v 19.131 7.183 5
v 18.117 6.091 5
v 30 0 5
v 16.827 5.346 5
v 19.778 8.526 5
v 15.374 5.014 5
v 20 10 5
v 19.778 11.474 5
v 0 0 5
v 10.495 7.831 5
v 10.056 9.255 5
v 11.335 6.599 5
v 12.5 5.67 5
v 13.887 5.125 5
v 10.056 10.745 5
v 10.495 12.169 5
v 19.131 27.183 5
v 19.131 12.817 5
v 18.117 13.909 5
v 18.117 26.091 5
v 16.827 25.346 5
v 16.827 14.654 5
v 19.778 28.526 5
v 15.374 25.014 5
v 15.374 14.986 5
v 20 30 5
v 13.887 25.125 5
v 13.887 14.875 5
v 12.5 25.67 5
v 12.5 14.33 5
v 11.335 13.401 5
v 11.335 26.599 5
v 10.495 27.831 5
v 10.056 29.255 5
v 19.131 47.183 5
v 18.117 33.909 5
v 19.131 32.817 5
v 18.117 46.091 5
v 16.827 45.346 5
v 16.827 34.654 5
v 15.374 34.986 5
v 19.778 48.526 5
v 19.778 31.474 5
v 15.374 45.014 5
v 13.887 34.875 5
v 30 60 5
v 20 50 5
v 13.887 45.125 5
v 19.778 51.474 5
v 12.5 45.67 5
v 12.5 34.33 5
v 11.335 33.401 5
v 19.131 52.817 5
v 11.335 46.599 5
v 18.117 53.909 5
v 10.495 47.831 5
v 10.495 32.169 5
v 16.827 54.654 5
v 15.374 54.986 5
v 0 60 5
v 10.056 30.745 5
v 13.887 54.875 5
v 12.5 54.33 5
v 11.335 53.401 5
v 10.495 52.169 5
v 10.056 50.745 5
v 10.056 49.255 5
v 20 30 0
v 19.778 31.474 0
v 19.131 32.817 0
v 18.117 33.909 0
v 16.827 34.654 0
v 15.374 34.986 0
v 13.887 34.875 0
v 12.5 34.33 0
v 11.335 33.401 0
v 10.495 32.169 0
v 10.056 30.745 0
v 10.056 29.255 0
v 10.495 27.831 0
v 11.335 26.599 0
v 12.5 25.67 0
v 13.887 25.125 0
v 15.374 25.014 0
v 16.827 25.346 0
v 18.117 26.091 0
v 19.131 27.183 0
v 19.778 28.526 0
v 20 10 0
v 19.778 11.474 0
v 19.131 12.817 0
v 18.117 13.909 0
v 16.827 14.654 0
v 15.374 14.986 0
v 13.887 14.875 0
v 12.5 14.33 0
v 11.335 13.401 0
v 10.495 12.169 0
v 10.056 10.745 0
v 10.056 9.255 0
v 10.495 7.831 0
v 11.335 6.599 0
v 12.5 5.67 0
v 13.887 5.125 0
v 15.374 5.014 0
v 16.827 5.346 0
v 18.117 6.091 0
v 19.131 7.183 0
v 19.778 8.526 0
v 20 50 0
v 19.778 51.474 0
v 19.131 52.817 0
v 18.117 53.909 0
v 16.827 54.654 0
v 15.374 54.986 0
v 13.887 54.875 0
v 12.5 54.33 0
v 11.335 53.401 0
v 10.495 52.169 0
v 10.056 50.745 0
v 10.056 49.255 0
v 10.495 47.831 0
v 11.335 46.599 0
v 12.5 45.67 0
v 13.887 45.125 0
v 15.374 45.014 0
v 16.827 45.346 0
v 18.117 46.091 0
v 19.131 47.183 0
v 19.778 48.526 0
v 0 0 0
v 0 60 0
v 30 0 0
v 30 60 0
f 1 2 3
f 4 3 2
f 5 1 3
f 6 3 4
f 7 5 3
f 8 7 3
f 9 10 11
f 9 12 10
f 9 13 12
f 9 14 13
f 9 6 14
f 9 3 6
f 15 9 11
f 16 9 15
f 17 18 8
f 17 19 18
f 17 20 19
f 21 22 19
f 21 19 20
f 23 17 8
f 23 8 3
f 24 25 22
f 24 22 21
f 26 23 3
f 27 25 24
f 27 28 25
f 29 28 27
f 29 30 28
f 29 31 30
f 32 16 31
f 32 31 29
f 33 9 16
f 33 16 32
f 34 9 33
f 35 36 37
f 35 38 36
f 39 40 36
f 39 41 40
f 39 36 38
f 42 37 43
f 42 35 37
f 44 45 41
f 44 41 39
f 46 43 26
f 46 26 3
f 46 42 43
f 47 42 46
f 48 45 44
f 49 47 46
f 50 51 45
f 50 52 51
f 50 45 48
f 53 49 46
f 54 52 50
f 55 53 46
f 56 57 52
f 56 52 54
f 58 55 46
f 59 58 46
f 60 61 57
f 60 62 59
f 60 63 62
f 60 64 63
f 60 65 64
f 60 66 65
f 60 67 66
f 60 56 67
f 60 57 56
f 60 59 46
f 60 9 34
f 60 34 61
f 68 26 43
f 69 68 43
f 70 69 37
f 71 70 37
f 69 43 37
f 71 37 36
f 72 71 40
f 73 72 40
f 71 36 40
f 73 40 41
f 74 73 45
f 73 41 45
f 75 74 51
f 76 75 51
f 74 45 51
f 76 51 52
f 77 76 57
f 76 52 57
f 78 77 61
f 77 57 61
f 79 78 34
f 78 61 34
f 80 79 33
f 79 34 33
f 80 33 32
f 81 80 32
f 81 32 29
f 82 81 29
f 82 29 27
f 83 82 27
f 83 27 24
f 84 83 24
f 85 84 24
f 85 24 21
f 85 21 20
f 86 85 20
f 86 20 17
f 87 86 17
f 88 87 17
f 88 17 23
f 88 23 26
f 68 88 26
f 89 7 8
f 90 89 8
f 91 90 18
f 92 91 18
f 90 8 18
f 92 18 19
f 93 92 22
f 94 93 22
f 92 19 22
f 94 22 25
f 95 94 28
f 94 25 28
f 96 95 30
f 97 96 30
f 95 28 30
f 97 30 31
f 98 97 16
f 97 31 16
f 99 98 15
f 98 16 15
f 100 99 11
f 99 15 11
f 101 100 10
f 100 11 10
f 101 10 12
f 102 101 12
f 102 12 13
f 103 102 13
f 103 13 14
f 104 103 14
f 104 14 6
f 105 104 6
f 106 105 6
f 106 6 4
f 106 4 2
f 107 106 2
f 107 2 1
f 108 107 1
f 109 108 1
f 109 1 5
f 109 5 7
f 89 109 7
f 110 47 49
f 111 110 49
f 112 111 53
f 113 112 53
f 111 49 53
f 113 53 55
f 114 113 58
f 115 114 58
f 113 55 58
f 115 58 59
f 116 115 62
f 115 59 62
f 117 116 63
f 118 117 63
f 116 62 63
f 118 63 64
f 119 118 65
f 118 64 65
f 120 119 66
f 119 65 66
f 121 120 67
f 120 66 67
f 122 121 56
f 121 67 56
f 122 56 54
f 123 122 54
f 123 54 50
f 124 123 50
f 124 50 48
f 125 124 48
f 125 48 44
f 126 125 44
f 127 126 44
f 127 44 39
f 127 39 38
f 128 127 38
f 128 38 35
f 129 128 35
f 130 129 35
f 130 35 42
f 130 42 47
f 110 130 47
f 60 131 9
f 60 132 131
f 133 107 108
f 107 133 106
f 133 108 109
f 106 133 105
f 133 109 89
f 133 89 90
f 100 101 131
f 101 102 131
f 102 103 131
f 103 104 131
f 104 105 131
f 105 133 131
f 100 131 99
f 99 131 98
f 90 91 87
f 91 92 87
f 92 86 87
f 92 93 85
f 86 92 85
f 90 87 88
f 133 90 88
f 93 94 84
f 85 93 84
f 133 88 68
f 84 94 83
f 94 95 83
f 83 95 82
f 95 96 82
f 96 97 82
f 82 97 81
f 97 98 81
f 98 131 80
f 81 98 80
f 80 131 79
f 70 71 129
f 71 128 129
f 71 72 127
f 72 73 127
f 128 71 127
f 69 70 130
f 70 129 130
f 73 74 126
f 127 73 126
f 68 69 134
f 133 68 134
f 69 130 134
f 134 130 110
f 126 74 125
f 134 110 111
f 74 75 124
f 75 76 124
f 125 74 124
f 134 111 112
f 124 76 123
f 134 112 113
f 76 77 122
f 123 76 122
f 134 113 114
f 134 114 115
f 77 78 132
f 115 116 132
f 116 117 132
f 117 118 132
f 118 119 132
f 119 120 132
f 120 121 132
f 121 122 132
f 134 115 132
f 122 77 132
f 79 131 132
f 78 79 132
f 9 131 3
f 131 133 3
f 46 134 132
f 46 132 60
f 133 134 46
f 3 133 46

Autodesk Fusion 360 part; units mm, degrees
box "Primitiva de caixa1" add length 60 width 30 height 5 placed x (0, 1, 0) y (-1, 0, 0) z (0, 0, 1) at (30, 0, 0)
cylinder "Cilindro primitivo1" cut diameter 10 height -42 placed x (1, 0, 0) y (0, 1, 0) z (0, 0, 1) at (15, 10, 5)
cylinder "Cilindro primitivo2" cut diameter 10 height -21 placed x (1, 0, 0) y (0, 1, 0) z (0, 0, 1) at (15, 50, 5)
cylinder "Cilindro primitivo3" cut diameter 10 height -17 placed x (1, 0, 0) y (0, 1, 0) z (0, 0, 1) at (15, 30, 5)
